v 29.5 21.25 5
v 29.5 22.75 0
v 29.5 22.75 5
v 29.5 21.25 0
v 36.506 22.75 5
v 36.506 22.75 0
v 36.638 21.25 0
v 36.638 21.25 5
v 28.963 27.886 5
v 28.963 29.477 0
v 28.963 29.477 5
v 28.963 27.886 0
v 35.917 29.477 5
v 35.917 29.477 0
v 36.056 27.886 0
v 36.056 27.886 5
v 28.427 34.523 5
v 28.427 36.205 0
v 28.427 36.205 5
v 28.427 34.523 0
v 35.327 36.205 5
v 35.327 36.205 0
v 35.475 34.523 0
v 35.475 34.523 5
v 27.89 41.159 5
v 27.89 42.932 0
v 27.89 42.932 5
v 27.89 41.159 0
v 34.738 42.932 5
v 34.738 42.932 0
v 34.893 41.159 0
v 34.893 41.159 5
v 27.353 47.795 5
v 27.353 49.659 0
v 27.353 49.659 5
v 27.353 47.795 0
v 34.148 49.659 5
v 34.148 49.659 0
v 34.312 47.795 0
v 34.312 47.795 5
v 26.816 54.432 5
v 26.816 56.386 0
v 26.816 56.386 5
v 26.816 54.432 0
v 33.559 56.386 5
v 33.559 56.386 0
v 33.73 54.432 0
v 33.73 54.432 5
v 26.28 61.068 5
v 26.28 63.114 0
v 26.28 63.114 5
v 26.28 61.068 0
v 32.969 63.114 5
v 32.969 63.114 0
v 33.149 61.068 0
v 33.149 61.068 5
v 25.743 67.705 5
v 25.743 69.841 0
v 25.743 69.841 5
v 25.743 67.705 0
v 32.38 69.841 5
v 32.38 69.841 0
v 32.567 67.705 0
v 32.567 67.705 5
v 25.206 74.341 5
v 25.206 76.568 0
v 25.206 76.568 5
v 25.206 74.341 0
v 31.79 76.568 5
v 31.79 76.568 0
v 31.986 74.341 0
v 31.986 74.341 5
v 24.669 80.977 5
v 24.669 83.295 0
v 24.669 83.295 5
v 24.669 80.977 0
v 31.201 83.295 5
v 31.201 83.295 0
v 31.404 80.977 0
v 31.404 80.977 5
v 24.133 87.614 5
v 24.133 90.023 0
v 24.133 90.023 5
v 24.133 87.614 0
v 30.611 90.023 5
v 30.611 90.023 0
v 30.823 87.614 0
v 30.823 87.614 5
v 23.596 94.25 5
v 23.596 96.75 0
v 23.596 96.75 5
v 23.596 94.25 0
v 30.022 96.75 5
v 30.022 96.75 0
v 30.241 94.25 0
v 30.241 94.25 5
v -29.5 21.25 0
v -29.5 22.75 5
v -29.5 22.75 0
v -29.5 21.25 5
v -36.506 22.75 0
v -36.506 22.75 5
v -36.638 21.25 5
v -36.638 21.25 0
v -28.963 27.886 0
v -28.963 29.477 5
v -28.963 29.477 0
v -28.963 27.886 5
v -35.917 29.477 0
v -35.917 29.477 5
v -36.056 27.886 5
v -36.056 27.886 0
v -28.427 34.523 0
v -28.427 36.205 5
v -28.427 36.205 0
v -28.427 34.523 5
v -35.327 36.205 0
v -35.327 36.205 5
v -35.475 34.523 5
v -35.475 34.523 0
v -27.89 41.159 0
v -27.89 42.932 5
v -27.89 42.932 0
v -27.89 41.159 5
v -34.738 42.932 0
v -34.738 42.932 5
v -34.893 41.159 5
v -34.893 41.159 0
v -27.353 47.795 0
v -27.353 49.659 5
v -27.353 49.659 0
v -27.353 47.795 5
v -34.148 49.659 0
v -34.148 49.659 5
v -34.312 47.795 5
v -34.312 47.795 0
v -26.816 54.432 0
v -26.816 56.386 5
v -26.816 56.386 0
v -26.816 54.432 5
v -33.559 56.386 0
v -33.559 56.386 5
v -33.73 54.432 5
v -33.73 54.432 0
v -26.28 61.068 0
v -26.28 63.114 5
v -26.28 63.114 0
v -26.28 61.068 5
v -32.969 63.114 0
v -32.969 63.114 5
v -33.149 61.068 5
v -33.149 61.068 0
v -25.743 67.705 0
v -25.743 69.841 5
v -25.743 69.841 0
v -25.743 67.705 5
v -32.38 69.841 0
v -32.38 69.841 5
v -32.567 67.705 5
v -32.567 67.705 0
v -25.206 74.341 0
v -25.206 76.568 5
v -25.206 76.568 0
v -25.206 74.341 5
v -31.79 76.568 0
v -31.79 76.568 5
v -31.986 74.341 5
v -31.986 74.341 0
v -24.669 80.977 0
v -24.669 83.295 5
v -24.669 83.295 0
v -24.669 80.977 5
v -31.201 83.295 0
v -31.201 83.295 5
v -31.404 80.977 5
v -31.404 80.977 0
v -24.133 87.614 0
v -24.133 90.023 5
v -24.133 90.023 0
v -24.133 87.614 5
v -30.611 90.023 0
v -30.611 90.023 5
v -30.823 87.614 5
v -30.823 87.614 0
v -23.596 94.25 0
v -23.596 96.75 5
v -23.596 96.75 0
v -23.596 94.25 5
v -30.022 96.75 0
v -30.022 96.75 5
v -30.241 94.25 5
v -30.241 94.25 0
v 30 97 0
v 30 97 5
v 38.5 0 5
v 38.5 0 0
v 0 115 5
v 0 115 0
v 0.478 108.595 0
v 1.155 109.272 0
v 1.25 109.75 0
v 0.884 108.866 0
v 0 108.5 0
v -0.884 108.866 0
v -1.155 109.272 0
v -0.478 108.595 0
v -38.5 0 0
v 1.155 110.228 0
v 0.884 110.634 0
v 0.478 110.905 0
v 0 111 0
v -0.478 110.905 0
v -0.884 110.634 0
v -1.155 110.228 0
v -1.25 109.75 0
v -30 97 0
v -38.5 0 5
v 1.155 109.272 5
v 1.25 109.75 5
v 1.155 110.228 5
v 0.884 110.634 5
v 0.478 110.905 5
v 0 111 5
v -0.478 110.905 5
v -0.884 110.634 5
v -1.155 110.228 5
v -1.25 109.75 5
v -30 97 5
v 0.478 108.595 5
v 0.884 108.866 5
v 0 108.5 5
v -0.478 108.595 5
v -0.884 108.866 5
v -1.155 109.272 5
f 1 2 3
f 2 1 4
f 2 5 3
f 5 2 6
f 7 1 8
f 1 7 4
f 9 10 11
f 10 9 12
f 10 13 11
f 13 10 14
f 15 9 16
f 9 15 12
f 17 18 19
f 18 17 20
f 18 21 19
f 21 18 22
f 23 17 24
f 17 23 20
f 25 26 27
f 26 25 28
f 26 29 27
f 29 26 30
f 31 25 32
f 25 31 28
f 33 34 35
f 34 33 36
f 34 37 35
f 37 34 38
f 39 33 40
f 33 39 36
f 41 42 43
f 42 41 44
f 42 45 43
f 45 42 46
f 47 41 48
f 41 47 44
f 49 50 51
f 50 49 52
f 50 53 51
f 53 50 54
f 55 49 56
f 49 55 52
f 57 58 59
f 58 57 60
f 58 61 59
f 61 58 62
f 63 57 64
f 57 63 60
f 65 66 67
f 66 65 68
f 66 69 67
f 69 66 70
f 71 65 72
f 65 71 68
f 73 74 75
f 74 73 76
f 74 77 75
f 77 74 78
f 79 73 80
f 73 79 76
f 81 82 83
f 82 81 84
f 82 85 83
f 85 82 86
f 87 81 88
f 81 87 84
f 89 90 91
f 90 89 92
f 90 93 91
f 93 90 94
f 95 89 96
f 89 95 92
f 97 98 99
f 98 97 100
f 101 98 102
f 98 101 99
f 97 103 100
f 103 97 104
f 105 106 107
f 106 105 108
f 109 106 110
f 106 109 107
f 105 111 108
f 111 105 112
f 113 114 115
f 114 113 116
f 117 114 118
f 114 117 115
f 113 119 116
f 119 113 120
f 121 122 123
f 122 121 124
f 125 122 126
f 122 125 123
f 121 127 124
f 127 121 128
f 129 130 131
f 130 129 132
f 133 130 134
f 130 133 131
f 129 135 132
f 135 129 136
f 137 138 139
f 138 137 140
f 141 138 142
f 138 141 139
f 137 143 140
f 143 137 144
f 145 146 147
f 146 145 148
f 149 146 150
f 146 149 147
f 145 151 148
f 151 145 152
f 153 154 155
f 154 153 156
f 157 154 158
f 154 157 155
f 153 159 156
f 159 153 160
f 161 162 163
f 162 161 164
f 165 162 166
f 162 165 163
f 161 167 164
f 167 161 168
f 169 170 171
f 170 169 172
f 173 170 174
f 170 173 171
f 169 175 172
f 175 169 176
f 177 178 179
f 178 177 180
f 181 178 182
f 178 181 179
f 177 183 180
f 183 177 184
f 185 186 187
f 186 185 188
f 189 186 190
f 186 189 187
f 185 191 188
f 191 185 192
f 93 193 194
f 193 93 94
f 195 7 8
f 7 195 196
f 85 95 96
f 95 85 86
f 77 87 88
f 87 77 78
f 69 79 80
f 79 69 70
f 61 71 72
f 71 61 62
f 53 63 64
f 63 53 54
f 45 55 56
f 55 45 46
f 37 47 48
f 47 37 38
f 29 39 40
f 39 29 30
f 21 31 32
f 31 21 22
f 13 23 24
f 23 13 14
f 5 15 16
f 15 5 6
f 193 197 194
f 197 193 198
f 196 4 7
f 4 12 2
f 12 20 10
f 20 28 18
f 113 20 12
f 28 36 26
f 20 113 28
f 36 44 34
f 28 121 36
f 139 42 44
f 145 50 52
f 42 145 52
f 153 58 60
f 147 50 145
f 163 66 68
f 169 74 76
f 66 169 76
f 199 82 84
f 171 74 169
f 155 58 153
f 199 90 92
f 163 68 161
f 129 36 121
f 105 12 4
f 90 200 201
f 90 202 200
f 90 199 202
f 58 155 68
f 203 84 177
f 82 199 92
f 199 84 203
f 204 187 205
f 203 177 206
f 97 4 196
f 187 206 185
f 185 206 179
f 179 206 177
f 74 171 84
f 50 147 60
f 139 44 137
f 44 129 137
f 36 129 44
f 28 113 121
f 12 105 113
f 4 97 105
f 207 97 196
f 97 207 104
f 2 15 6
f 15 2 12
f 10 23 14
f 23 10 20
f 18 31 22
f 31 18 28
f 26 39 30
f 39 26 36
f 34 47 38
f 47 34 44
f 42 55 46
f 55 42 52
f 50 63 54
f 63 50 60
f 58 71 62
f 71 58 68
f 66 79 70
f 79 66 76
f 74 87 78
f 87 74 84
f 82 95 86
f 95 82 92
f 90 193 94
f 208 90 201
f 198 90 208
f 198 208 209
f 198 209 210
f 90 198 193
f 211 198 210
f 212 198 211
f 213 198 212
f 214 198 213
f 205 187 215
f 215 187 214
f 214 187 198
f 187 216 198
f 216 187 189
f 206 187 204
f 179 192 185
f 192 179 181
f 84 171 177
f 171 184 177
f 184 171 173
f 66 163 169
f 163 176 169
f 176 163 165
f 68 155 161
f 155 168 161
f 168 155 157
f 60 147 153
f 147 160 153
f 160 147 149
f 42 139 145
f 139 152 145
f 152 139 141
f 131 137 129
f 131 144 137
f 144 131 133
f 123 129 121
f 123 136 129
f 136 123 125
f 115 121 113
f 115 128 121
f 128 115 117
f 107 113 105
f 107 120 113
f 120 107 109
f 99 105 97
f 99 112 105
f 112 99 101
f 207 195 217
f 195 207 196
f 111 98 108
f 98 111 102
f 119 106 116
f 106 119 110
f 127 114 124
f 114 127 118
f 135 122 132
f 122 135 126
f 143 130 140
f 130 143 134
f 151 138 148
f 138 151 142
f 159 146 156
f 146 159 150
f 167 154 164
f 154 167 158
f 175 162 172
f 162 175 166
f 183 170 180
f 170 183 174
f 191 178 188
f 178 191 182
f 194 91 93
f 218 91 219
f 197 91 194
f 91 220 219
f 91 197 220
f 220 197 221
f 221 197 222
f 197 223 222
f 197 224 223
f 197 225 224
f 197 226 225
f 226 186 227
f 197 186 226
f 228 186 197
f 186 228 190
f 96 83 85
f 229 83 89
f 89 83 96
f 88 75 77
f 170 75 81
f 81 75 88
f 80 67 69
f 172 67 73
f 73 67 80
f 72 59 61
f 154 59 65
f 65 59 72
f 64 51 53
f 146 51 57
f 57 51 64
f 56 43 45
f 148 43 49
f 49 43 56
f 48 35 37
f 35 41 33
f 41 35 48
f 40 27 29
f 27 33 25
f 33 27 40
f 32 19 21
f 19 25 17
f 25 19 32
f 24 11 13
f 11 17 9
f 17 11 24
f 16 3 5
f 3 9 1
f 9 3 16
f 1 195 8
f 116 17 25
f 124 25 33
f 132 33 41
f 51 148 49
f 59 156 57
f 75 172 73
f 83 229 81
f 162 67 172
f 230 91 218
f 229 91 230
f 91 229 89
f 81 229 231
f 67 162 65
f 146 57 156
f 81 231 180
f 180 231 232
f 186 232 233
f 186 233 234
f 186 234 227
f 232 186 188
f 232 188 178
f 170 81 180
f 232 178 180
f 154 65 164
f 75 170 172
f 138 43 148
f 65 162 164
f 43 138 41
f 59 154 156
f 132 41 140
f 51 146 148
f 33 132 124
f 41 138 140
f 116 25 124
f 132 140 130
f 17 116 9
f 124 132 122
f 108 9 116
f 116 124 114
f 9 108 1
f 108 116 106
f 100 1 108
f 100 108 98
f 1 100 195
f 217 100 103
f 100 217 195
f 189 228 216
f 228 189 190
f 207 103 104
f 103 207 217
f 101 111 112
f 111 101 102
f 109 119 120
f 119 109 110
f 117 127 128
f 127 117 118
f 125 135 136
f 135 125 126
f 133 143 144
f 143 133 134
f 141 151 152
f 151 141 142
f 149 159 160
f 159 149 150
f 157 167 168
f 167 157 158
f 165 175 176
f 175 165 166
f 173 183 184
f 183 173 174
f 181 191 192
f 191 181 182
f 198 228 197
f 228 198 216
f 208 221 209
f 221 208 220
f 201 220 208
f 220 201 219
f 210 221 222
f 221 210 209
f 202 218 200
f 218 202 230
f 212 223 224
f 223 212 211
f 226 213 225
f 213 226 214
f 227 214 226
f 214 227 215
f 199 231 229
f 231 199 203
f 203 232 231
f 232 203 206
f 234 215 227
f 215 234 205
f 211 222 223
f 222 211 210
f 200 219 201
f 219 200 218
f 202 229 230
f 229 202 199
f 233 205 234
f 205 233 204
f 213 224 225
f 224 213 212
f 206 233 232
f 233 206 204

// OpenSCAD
$fa = 0.5;
$fs = 0.5;
base_width = 77;
top_width = 60;
base_height = 97;
total_height = 115;
top_height = total_height - base_height;
num_slots = 12;
lower_slot_height=23.5;
lower_slot_width = 1.5;
slot_length = 6;
top_slot_width = 2.5;
drill_d = 2;
top_hole_d = 2.5;
top_hole_offset = 4 + top_hole_d / 2;
thickness = 5;

points = [ [0,0], [base_width/2,0], [top_width/2,base_height], [0,total_height]];

module slots()
{
    slot_w_increase = ( top_slot_width - lower_slot_width ) / (num_slots - 1);
    slot_y_increase = ( base_height - lower_slot_height ) / (num_slots -1 );
    lower_slot_base_width = base_width+((top_width-base_width)/base_height)*lower_slot_height;
    echo(lower_slot_base_width);
    slot_x_increase = ( lower_slot_base_width - top_width ) / 2 / (num_slots );
    for( i = [0:num_slots-1] )
    {
        translate([base_width/2-slot_length/2-slot_x_increase*i,lower_slot_height+i*slot_y_increase-lower_slot_width,thickness/2])
        assign(slot_width = lower_slot_width+i*slot_w_increase)
            cube([slot_length*2,slot_width,thickness*2],center=true);
    }
}

difference()
{
    bridge();
    slots();
    mirror([1,0,0])
        slots();
    translate([0,total_height-top_hole_offset,thickness/2])
        cylinder(r=top_hole_d/2,h=thickness*2,center=true);
}
module bridge()
linear_extrude(height=thickness)
{
    mirror([1,0,0])
        polygon(points);
    polygon(points);
}
